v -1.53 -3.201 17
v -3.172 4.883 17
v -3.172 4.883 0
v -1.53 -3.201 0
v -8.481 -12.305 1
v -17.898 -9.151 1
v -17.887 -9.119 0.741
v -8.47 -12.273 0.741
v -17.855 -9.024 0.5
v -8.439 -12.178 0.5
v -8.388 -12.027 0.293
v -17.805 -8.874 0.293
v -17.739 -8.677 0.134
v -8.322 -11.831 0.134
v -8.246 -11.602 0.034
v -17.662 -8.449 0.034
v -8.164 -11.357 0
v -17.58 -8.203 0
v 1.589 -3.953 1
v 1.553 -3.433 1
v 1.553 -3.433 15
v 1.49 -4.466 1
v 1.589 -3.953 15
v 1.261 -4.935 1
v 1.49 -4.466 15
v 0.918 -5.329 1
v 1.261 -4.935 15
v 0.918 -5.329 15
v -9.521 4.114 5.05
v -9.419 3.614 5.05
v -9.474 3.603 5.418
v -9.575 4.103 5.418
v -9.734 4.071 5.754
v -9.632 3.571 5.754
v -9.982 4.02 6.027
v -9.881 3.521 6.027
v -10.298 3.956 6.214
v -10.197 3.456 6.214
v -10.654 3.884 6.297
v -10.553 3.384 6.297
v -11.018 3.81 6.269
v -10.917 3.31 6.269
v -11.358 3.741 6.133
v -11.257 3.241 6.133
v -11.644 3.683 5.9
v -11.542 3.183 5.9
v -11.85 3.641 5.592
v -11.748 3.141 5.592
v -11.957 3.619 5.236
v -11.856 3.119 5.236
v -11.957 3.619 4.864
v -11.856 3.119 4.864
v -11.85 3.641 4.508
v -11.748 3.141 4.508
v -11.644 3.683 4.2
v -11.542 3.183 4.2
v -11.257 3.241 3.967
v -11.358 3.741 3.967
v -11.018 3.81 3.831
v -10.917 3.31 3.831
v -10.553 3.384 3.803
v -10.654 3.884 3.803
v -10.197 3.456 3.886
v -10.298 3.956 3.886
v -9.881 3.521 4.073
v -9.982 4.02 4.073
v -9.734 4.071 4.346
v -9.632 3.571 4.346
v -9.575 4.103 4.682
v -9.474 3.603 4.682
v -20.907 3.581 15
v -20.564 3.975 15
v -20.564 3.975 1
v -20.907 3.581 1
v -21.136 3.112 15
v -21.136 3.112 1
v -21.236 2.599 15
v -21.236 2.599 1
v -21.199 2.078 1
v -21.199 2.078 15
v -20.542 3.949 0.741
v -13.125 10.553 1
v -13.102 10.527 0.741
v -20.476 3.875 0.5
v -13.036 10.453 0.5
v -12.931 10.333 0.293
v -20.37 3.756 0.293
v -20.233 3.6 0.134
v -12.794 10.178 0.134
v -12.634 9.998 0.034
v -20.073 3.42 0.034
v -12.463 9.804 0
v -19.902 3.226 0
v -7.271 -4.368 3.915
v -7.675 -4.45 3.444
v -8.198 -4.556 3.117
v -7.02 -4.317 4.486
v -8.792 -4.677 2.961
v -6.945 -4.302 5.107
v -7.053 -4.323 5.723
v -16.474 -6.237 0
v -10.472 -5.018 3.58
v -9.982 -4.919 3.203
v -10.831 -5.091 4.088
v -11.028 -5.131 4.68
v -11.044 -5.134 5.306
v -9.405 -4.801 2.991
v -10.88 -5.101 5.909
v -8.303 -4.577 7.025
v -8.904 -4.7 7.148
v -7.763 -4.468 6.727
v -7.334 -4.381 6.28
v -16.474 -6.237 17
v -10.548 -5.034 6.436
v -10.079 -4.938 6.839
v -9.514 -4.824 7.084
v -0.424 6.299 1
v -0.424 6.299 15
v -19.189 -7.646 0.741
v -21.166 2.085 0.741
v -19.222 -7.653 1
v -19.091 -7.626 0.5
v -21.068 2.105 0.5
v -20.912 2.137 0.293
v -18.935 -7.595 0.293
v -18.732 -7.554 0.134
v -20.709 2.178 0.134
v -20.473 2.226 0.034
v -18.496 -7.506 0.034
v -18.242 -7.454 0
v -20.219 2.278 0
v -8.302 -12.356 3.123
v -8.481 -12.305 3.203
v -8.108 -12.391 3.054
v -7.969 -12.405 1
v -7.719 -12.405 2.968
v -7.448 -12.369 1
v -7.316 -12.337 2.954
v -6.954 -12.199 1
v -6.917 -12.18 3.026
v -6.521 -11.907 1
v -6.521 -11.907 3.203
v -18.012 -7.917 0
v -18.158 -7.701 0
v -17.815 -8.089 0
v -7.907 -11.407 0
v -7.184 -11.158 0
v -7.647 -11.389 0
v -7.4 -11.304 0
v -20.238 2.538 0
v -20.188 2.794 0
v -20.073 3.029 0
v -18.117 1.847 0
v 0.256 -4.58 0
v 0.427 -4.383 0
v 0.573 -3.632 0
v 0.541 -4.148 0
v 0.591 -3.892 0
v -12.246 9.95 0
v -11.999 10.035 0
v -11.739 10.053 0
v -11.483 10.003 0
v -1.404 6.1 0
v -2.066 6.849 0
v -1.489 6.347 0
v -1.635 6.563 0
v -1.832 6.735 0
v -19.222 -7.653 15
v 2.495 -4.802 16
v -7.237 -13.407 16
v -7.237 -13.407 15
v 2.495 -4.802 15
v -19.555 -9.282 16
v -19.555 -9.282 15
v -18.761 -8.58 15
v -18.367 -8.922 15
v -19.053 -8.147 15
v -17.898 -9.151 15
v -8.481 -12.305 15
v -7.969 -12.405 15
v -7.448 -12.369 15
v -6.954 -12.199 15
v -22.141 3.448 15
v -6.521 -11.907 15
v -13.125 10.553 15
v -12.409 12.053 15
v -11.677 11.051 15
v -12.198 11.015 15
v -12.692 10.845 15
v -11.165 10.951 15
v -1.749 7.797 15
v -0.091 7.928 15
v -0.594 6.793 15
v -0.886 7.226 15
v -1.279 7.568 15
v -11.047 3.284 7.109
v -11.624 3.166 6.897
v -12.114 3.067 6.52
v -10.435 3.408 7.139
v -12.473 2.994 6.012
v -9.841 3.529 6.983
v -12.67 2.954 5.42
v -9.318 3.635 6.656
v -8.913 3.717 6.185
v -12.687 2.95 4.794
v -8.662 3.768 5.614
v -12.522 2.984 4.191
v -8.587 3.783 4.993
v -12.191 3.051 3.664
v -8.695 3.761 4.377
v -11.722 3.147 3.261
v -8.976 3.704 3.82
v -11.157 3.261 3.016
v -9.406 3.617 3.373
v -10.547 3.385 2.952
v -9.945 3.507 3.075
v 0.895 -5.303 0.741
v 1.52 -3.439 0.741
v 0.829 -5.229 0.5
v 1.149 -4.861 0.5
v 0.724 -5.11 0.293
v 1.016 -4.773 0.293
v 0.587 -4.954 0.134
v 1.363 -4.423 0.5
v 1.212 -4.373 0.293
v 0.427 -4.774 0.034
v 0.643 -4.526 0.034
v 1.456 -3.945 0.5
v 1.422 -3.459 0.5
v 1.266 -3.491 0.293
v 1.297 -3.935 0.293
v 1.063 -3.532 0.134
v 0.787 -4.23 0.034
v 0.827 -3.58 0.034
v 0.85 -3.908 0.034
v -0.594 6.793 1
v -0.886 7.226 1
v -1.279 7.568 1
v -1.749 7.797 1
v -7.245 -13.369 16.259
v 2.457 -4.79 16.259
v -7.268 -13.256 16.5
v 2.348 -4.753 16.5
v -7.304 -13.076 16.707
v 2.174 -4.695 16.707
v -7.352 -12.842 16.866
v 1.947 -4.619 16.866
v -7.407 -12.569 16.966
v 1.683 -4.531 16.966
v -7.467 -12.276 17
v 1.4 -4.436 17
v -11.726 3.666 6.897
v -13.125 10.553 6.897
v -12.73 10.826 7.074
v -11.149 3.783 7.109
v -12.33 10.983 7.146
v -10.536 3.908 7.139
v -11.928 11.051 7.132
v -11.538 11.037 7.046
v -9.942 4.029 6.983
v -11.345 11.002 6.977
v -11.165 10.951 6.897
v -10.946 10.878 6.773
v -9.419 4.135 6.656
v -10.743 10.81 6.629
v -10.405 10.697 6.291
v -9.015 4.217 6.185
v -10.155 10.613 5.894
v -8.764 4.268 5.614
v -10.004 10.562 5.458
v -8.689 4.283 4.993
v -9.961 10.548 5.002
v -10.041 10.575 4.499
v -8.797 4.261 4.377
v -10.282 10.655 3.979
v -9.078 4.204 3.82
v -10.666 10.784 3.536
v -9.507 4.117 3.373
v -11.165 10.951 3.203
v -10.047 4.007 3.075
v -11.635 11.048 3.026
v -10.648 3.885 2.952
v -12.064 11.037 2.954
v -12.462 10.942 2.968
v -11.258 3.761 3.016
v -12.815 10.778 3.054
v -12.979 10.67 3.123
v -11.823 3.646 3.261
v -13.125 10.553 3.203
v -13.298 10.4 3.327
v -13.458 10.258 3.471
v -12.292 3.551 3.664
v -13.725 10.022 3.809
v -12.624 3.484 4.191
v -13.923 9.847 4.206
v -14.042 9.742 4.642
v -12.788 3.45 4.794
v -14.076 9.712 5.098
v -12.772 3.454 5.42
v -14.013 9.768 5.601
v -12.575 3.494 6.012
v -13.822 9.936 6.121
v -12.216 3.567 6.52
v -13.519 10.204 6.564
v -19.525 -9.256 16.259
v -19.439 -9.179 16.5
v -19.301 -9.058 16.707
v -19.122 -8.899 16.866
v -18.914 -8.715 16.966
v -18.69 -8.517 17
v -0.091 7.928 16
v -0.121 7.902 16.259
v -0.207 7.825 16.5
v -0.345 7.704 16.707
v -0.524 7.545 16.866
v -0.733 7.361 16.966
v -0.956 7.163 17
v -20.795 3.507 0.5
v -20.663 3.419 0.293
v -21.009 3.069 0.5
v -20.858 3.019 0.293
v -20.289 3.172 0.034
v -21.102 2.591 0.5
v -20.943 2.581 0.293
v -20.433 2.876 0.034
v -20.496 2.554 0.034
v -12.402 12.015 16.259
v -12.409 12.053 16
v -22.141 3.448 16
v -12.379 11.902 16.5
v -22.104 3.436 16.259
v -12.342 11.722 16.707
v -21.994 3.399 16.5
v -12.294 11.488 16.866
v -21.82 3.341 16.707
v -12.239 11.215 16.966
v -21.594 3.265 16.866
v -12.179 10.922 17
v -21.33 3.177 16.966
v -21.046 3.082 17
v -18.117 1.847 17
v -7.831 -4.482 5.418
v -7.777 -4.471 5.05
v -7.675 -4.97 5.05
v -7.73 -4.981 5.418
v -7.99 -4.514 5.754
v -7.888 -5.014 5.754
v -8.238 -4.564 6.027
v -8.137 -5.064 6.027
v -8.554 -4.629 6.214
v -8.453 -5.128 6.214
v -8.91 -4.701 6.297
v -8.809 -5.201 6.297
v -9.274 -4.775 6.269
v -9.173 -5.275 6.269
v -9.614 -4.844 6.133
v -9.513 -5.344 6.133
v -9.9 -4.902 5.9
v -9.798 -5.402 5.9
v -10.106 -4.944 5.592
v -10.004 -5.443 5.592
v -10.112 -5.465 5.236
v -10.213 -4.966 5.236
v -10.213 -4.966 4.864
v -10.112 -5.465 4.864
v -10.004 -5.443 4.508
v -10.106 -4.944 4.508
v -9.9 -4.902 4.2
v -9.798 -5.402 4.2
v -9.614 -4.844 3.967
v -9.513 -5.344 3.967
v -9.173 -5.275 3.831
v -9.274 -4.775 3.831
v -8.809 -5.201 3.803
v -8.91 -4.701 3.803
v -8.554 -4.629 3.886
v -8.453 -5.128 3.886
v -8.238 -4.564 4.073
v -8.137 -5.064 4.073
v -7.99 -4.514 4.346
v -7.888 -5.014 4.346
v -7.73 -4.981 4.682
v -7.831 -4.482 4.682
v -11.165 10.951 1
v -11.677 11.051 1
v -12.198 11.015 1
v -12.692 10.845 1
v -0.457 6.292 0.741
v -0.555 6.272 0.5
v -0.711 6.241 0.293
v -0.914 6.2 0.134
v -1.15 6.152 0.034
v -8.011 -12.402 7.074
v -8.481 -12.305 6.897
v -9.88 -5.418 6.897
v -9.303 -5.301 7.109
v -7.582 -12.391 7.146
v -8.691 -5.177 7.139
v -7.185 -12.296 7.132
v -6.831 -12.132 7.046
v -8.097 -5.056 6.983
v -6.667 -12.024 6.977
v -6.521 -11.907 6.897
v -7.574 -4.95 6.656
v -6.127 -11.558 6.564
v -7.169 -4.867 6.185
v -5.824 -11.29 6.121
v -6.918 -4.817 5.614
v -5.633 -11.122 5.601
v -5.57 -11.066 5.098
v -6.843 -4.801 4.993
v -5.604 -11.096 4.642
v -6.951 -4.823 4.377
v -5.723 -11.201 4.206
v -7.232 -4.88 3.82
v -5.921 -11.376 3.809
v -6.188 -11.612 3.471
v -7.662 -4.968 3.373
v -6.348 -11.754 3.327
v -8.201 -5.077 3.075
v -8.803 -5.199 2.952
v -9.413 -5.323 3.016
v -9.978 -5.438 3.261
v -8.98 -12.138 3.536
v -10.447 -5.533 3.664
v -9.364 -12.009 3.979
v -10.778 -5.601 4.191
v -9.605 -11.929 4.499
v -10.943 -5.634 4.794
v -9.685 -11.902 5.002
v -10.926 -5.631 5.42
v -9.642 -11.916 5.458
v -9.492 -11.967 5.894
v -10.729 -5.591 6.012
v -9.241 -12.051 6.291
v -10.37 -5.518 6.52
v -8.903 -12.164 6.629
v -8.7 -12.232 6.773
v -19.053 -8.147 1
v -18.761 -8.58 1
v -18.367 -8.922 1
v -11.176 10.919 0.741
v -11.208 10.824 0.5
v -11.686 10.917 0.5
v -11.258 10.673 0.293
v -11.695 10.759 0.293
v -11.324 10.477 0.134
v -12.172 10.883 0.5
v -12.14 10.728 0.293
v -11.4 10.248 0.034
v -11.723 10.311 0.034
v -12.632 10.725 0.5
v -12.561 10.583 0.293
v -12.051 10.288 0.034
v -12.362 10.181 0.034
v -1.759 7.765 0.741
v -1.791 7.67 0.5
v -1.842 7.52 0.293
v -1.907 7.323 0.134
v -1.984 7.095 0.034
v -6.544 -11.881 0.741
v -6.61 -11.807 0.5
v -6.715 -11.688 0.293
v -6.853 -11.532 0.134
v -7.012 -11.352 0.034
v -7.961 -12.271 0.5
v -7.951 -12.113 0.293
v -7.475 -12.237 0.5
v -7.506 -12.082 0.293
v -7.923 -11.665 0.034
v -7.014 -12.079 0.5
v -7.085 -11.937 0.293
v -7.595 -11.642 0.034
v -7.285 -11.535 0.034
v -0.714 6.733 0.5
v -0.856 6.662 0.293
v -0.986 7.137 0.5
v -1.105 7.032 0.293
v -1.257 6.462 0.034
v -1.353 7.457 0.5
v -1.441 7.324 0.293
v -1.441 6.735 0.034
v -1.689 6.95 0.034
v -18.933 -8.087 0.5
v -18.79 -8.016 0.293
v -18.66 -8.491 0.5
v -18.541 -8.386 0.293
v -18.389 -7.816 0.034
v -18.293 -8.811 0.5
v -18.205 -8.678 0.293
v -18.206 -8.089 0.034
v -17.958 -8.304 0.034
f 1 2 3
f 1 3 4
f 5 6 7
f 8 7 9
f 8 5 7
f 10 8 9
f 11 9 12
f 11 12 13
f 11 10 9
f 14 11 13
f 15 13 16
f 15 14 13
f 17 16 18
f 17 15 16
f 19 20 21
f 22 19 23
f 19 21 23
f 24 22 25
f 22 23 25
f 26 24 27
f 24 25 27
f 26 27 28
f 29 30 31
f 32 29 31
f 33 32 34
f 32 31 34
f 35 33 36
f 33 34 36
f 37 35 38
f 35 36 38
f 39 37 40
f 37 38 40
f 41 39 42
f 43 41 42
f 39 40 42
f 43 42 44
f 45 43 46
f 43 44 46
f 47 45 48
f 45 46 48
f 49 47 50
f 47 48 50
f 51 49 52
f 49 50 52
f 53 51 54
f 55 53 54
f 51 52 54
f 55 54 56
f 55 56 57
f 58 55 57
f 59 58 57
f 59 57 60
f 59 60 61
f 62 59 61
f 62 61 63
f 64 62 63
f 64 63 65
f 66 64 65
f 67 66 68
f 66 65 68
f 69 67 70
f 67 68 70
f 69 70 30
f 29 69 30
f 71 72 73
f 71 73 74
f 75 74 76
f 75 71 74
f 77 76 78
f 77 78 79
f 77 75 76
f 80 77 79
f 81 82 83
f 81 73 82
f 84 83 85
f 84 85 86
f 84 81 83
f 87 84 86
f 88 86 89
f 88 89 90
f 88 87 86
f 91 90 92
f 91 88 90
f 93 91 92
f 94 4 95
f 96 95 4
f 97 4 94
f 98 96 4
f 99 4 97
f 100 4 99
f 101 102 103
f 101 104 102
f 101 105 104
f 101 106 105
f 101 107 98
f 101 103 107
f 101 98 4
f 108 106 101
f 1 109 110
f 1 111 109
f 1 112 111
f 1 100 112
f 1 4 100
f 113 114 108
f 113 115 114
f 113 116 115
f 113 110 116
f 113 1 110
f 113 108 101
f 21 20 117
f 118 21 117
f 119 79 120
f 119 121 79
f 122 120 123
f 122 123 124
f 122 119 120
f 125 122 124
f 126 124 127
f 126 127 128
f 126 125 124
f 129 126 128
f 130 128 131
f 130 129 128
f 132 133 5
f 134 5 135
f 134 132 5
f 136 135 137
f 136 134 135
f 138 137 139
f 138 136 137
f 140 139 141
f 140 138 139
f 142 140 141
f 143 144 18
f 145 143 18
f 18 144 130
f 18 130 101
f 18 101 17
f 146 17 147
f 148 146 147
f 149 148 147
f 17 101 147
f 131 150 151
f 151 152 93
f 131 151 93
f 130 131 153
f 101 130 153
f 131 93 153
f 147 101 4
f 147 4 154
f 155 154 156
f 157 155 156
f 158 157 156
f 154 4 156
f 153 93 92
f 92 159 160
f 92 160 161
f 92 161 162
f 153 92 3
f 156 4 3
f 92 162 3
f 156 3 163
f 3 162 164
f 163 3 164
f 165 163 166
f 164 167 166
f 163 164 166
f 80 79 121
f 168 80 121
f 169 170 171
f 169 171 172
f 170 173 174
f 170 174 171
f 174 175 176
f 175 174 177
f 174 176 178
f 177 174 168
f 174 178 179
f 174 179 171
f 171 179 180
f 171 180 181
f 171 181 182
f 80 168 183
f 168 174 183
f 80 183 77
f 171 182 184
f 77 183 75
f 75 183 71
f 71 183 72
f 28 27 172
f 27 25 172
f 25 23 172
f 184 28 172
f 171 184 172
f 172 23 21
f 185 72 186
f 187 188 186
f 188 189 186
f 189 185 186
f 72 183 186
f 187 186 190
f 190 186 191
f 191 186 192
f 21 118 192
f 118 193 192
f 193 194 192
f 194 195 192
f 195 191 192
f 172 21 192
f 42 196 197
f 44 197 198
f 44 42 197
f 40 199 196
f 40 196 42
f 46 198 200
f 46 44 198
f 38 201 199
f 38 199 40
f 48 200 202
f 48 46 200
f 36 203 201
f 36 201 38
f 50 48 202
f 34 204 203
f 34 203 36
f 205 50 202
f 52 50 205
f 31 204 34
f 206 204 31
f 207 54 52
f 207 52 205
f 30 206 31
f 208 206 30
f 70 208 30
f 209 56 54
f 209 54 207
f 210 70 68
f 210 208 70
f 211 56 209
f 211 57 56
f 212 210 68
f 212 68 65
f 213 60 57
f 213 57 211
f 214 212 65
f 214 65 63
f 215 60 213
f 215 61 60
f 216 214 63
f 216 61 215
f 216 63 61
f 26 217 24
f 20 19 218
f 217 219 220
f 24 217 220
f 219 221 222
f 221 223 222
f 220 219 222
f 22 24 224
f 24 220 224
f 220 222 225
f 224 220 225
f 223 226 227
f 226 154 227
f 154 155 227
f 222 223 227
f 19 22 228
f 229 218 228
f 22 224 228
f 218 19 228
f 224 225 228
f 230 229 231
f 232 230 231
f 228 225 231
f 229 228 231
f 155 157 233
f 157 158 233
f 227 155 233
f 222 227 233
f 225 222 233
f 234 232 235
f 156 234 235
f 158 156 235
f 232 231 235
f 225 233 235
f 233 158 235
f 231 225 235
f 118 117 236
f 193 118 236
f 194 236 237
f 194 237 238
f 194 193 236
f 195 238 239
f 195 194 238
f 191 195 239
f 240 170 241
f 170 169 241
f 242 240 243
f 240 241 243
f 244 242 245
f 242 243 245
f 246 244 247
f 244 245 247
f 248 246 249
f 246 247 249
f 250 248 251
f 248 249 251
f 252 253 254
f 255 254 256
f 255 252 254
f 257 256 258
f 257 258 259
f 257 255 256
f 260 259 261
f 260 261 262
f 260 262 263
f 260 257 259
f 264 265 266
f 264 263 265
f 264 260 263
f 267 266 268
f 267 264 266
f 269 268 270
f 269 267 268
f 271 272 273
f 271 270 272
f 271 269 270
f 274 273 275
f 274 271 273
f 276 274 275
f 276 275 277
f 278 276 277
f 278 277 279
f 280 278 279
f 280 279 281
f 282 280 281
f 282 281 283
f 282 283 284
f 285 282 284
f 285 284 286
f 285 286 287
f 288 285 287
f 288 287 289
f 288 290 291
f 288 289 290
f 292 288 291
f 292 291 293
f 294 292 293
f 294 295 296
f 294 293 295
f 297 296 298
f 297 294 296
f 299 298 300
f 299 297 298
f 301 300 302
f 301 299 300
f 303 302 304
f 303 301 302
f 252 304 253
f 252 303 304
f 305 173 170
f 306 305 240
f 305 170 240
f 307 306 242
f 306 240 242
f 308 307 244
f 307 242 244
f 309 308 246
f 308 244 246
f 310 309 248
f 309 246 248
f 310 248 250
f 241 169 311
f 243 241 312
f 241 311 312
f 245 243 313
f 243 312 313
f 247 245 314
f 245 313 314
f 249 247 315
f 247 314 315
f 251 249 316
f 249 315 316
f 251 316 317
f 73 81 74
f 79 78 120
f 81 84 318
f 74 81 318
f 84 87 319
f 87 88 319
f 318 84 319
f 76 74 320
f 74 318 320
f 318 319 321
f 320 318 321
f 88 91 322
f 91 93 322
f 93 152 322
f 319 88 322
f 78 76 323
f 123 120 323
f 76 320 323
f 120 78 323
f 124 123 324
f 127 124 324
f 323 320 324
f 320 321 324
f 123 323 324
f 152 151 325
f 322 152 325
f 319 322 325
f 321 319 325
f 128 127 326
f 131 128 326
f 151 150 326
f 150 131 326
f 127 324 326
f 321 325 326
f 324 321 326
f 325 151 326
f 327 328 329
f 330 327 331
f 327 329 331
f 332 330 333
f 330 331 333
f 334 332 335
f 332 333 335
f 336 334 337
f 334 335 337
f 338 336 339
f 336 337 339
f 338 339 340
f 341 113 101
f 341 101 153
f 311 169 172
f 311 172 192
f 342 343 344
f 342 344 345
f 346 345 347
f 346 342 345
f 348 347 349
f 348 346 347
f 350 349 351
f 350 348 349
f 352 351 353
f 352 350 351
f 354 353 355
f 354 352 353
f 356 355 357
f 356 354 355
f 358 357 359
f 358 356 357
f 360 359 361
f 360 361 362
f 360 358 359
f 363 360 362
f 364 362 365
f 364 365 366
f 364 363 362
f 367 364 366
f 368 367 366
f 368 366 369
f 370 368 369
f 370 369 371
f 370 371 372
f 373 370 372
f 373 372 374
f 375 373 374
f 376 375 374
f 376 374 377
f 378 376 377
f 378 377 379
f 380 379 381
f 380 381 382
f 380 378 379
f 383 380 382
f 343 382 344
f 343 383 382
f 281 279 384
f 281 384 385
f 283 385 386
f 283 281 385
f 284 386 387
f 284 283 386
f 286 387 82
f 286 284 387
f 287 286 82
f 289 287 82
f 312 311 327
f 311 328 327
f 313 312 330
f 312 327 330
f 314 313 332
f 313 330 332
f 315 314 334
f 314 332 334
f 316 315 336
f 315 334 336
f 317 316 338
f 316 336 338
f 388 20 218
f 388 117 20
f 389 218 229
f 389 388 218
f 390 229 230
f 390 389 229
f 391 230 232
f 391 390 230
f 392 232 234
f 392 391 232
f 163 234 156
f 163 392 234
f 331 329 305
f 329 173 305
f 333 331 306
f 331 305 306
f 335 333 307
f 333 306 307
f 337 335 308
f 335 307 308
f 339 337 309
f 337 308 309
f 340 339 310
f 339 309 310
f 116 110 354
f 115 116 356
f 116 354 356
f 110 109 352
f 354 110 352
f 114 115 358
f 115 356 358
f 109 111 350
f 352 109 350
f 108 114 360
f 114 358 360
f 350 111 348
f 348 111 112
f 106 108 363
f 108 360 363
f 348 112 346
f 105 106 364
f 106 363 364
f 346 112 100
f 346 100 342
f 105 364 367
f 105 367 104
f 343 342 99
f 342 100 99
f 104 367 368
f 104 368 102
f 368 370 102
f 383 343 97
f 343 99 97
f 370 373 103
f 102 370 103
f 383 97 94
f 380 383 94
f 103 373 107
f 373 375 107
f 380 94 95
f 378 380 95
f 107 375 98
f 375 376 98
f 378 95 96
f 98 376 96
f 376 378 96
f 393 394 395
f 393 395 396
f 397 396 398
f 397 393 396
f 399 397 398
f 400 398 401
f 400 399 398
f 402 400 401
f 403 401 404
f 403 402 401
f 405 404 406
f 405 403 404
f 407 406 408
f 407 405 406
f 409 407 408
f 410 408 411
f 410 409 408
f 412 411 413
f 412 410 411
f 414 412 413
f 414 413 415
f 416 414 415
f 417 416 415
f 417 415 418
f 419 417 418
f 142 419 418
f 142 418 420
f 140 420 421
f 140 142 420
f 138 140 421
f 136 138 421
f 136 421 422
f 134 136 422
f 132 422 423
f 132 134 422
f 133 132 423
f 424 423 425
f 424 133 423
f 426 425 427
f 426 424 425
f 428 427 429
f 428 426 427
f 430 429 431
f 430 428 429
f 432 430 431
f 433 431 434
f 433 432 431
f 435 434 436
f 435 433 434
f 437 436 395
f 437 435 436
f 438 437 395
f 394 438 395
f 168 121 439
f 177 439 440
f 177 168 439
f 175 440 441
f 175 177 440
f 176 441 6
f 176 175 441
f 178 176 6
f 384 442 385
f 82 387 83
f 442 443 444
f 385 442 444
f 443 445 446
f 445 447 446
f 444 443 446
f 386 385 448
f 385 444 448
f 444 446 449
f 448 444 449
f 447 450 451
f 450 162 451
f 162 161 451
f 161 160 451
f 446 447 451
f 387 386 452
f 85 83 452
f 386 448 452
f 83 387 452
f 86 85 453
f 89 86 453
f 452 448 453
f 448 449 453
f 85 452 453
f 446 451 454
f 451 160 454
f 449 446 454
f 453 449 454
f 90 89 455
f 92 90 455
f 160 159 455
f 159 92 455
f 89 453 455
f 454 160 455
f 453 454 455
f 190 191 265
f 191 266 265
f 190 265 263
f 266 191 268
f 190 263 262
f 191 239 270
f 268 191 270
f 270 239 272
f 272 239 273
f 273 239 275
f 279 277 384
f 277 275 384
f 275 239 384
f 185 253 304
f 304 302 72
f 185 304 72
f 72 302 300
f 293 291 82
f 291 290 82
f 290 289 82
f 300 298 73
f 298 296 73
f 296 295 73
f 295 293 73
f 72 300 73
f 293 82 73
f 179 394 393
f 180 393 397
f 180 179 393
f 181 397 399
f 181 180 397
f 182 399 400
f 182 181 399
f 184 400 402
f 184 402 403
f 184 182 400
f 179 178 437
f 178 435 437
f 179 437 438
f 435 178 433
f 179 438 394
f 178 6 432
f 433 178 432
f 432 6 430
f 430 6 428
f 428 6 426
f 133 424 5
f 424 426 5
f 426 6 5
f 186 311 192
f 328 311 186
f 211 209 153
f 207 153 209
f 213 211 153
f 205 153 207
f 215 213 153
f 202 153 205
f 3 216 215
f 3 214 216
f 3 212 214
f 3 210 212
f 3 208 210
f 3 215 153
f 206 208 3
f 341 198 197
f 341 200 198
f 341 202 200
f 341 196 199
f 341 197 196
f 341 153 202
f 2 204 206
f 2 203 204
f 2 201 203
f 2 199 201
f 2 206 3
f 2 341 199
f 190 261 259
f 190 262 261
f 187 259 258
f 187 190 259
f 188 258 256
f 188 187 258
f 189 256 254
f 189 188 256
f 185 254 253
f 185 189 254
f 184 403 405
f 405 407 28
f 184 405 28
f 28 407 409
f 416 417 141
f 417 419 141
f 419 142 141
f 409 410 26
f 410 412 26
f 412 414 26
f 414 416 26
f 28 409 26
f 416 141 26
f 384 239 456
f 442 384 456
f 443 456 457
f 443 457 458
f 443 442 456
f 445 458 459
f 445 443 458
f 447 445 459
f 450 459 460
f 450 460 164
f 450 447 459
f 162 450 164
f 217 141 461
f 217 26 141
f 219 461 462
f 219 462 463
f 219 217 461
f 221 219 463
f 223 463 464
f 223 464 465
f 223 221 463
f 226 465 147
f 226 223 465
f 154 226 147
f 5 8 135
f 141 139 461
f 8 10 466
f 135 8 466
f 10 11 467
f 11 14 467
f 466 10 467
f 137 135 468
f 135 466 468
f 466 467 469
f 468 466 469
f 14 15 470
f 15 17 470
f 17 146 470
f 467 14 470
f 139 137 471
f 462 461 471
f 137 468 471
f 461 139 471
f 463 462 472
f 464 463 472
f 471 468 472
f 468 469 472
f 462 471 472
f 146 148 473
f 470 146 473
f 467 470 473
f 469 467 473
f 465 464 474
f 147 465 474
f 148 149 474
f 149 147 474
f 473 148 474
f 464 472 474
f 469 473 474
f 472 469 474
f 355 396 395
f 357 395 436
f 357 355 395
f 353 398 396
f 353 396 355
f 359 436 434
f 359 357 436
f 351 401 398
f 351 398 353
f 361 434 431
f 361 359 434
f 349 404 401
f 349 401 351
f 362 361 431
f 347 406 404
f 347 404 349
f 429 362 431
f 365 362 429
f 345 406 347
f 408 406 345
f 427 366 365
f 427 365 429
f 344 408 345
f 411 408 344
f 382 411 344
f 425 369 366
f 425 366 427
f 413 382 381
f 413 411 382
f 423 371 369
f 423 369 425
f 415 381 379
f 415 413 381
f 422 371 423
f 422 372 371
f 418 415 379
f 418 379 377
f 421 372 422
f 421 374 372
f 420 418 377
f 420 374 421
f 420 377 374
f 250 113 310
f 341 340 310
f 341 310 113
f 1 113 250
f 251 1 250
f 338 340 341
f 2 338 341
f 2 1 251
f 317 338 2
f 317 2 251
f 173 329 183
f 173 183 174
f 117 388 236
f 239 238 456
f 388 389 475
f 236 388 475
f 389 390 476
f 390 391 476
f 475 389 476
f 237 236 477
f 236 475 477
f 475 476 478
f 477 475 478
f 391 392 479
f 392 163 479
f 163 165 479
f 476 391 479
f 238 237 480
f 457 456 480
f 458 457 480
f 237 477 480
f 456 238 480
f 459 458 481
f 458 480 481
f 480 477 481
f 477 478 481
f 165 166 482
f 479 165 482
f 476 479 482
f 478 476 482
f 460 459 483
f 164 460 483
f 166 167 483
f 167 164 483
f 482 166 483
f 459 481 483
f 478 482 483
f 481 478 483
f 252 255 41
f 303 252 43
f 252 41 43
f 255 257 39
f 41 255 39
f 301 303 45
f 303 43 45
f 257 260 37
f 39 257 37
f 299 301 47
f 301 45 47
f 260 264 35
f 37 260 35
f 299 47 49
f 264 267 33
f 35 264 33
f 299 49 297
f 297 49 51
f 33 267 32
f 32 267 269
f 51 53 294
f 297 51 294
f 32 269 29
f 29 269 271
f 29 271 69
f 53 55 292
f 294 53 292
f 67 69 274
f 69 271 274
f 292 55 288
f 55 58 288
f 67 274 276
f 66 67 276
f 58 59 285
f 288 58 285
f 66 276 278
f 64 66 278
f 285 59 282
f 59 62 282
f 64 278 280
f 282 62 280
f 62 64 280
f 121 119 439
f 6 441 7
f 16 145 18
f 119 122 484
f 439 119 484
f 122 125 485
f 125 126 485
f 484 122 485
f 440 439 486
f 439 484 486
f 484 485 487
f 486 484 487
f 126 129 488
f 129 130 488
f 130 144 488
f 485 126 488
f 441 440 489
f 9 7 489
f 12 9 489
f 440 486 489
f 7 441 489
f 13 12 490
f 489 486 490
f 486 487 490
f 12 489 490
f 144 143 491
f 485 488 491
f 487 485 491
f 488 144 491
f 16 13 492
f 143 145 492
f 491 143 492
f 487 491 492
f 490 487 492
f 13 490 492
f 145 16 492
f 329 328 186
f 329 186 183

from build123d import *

# Parameters (mm, degrees)
DODANIE_WYCI_GNI_CIE1_DEPTH     = 17
ZAOKR_GLENIE1_R                 = 2
DODANIE_WYCI_GNI_CIE2_DEPTH     = 2
ZAOKR_GLENIE2_R                 = 1
ZAOKR_GLENIE3_R                 = 1
WYTNIJ_WYCI_GNI_CIE1_DEPTH      = 32.35628887
WYTNIJ_WYCI_GNI_CIE1_DEPTH_BACK = 32.35628887
SZKIC4_R                        = 2.1
WYTNIJ_WYCI_GNI_CIE2_DEPTH      = 31.967447566
SZKIC6_R                        = 2.1
SZKIC6_R_2                      = 1.25
DODANIE_WYCI_GNI_CIE3_DEPTH     = 0.51


with BuildPart() as part:
    # Szkic1 → Dodanie-wyciągnięcie1 (new body)
    with BuildSketch(Plane.XY):
        Polygon((1.783068787, -4.564092652), (-0.653727134, 7.430712848), (-12.25993137, 11.317788426), (-21.429339686, 3.210058505), (-18.992543765, -8.784746995), (-7.386339528, -12.671822573), align=None)
    extrude(amount=DODANIE_WYCI_GNI_CIE1_DEPTH)

    # Zaokrąglenie1
    zaokr_glenie1_edges = [part.edges().sort_by_distance(p)[0] for p in [
        (-7.386339528, -12.671822573, 8.5),
        (-18.992543765, -8.784746995, 8.5),
        (-21.429339686, 3.210058505, 8.5),
        (-12.25993137, 11.317788426, 8.5),
        (-0.653727134, 7.430712848, 8.5),
        (1.783068787, -4.564092652, 8.5),
    ]]
    fillet(zaokr_glenie1_edges, radius=ZAOKR_GLENIE1_R)

    # Szkic3 → Dodanie-wyciągnięcie2 (add)
    with BuildSketch(Plane.XY.offset(17)):
        Polygon((-0.091452095, 7.927884965), (-12.409357535, 12.053318952), (-22.141040889, 3.448416913), (-19.554818803, -9.281919113), (-7.236913363, -13.407353099), (2.494769991, -4.80245106), align=None)
    extrude(amount=-DODANIE_WYCI_GNI_CIE2_DEPTH)

    # Zaokrąglenie2
    zaokr_glenie2_edges = [part.edges().sort_by_distance(p)[0] for p in [
        (-6.456829252, 9.374250637, 0),
        (-2.80163537, -8.617957613, 0),
        (-13.189441647, -10.728284784, 0),
        (-20.210941725, -2.787344245, 0),
        (-16.844635528, 7.263923465, 0),
        (0.564670827, 1.433310098, 0),
        (-12.198333493, 11.014581025, 0),
        (-21.135955436, 3.111800131, 0),
        (-18.760757392, -8.579797968, 0),
        (-7.447937406, -12.368615173, 0),
        (1.489684537, -4.465834278, 0),
        (-0.885513507, 7.225763821, 0),
    ]]
    fillet(zaokr_glenie2_edges, radius=ZAOKR_GLENIE2_R)

    # Zaokrąglenie3
    zaokr_glenie3_edges = [part.edges().sort_by_distance(p)[0] for p in [
        (1.201658948, 1.562716953, 17),
        (-6.250404815, 9.990601959, 17),
        (-17.275199212, 7.750867932, 17),
        (-20.847929846, -2.9167511, 17),
        (-13.395866083, -11.344636106, 17),
        (-2.371071686, -9.10490208, 17),
    ]]
    fillet(zaokr_glenie3_edges, radius=ZAOKR_GLENIE3_R)

    # Szkic4 → Wytnij-wyciągnięcie1 (cut, two sides: drawn at the far end of the back side and taken through both)
    with BuildSketch(Plane(origin=(-0.257260592, 1.266331223, 0), x_dir=(0.9799817241599056, 0.19908746899937949, 0), z_dir=(-0.19908746899937946, 0.9799817241599055, 0)).offset(-WYTNIJ_WYCI_GNI_CIE1_DEPTH_BACK)):
        with Locations(Location((-9.76127883, -5.05, 0), (0, 0, 241.563109851))):
            Circle(SZKIC4_R)
    extrude(amount=WYTNIJ_WYCI_GNI_CIE1_DEPTH + WYTNIJ_WYCI_GNI_CIE1_DEPTH_BACK, mode=Mode.SUBTRACT)

    # Szkic5 → Wytnij-wyciągnięcie2 (cut, through all)
    with BuildSketch(Plane.XY.offset(17)):
        Polygon((-18.116731906, 1.847365587), (-3.172010612, 4.88344949), (-1.529538993, -3.201399735), (-16.474260286, -6.237483637), align=None)
    extrude(amount=-WYTNIJ_WYCI_GNI_CIE2_DEPTH, mode=Mode.SUBTRACT)

    # Szkic6 → Dodanie-wyciągnięcie3 (add)
    with BuildSketch(Plane(origin=(-1.078496401, 5.308755835, 0), x_dir=(0.9799817241599059, 0.19908746899937776, 0), z_dir=(0.19908746899937776, -0.9799817241599059, 0))):
        with Locations(Location((-9.76127883, 5.05, 0), (0, 0, 241.563109851))):
            Circle(SZKIC6_R)
        with Locations((-9.76127883, 5.05)):
            Circle(SZKIC6_R_2, mode=Mode.SUBTRACT)
    dodanie_wyci_gni_cie3 = extrude(amount=-DODANIE_WYCI_GNI_CIE3_DEPTH)

    # Lustro1: Dodanie-wyciągnięcie3 across plane
    add(dodanie_wyci_gni_cie3.mirror(Plane(origin=(-0.257260592, 1.266331223, 0), x_dir=(0, 0, 1), z_dir=(-0.19908746899937949, 0.9799817241599056, 0))))


solid = part.part
